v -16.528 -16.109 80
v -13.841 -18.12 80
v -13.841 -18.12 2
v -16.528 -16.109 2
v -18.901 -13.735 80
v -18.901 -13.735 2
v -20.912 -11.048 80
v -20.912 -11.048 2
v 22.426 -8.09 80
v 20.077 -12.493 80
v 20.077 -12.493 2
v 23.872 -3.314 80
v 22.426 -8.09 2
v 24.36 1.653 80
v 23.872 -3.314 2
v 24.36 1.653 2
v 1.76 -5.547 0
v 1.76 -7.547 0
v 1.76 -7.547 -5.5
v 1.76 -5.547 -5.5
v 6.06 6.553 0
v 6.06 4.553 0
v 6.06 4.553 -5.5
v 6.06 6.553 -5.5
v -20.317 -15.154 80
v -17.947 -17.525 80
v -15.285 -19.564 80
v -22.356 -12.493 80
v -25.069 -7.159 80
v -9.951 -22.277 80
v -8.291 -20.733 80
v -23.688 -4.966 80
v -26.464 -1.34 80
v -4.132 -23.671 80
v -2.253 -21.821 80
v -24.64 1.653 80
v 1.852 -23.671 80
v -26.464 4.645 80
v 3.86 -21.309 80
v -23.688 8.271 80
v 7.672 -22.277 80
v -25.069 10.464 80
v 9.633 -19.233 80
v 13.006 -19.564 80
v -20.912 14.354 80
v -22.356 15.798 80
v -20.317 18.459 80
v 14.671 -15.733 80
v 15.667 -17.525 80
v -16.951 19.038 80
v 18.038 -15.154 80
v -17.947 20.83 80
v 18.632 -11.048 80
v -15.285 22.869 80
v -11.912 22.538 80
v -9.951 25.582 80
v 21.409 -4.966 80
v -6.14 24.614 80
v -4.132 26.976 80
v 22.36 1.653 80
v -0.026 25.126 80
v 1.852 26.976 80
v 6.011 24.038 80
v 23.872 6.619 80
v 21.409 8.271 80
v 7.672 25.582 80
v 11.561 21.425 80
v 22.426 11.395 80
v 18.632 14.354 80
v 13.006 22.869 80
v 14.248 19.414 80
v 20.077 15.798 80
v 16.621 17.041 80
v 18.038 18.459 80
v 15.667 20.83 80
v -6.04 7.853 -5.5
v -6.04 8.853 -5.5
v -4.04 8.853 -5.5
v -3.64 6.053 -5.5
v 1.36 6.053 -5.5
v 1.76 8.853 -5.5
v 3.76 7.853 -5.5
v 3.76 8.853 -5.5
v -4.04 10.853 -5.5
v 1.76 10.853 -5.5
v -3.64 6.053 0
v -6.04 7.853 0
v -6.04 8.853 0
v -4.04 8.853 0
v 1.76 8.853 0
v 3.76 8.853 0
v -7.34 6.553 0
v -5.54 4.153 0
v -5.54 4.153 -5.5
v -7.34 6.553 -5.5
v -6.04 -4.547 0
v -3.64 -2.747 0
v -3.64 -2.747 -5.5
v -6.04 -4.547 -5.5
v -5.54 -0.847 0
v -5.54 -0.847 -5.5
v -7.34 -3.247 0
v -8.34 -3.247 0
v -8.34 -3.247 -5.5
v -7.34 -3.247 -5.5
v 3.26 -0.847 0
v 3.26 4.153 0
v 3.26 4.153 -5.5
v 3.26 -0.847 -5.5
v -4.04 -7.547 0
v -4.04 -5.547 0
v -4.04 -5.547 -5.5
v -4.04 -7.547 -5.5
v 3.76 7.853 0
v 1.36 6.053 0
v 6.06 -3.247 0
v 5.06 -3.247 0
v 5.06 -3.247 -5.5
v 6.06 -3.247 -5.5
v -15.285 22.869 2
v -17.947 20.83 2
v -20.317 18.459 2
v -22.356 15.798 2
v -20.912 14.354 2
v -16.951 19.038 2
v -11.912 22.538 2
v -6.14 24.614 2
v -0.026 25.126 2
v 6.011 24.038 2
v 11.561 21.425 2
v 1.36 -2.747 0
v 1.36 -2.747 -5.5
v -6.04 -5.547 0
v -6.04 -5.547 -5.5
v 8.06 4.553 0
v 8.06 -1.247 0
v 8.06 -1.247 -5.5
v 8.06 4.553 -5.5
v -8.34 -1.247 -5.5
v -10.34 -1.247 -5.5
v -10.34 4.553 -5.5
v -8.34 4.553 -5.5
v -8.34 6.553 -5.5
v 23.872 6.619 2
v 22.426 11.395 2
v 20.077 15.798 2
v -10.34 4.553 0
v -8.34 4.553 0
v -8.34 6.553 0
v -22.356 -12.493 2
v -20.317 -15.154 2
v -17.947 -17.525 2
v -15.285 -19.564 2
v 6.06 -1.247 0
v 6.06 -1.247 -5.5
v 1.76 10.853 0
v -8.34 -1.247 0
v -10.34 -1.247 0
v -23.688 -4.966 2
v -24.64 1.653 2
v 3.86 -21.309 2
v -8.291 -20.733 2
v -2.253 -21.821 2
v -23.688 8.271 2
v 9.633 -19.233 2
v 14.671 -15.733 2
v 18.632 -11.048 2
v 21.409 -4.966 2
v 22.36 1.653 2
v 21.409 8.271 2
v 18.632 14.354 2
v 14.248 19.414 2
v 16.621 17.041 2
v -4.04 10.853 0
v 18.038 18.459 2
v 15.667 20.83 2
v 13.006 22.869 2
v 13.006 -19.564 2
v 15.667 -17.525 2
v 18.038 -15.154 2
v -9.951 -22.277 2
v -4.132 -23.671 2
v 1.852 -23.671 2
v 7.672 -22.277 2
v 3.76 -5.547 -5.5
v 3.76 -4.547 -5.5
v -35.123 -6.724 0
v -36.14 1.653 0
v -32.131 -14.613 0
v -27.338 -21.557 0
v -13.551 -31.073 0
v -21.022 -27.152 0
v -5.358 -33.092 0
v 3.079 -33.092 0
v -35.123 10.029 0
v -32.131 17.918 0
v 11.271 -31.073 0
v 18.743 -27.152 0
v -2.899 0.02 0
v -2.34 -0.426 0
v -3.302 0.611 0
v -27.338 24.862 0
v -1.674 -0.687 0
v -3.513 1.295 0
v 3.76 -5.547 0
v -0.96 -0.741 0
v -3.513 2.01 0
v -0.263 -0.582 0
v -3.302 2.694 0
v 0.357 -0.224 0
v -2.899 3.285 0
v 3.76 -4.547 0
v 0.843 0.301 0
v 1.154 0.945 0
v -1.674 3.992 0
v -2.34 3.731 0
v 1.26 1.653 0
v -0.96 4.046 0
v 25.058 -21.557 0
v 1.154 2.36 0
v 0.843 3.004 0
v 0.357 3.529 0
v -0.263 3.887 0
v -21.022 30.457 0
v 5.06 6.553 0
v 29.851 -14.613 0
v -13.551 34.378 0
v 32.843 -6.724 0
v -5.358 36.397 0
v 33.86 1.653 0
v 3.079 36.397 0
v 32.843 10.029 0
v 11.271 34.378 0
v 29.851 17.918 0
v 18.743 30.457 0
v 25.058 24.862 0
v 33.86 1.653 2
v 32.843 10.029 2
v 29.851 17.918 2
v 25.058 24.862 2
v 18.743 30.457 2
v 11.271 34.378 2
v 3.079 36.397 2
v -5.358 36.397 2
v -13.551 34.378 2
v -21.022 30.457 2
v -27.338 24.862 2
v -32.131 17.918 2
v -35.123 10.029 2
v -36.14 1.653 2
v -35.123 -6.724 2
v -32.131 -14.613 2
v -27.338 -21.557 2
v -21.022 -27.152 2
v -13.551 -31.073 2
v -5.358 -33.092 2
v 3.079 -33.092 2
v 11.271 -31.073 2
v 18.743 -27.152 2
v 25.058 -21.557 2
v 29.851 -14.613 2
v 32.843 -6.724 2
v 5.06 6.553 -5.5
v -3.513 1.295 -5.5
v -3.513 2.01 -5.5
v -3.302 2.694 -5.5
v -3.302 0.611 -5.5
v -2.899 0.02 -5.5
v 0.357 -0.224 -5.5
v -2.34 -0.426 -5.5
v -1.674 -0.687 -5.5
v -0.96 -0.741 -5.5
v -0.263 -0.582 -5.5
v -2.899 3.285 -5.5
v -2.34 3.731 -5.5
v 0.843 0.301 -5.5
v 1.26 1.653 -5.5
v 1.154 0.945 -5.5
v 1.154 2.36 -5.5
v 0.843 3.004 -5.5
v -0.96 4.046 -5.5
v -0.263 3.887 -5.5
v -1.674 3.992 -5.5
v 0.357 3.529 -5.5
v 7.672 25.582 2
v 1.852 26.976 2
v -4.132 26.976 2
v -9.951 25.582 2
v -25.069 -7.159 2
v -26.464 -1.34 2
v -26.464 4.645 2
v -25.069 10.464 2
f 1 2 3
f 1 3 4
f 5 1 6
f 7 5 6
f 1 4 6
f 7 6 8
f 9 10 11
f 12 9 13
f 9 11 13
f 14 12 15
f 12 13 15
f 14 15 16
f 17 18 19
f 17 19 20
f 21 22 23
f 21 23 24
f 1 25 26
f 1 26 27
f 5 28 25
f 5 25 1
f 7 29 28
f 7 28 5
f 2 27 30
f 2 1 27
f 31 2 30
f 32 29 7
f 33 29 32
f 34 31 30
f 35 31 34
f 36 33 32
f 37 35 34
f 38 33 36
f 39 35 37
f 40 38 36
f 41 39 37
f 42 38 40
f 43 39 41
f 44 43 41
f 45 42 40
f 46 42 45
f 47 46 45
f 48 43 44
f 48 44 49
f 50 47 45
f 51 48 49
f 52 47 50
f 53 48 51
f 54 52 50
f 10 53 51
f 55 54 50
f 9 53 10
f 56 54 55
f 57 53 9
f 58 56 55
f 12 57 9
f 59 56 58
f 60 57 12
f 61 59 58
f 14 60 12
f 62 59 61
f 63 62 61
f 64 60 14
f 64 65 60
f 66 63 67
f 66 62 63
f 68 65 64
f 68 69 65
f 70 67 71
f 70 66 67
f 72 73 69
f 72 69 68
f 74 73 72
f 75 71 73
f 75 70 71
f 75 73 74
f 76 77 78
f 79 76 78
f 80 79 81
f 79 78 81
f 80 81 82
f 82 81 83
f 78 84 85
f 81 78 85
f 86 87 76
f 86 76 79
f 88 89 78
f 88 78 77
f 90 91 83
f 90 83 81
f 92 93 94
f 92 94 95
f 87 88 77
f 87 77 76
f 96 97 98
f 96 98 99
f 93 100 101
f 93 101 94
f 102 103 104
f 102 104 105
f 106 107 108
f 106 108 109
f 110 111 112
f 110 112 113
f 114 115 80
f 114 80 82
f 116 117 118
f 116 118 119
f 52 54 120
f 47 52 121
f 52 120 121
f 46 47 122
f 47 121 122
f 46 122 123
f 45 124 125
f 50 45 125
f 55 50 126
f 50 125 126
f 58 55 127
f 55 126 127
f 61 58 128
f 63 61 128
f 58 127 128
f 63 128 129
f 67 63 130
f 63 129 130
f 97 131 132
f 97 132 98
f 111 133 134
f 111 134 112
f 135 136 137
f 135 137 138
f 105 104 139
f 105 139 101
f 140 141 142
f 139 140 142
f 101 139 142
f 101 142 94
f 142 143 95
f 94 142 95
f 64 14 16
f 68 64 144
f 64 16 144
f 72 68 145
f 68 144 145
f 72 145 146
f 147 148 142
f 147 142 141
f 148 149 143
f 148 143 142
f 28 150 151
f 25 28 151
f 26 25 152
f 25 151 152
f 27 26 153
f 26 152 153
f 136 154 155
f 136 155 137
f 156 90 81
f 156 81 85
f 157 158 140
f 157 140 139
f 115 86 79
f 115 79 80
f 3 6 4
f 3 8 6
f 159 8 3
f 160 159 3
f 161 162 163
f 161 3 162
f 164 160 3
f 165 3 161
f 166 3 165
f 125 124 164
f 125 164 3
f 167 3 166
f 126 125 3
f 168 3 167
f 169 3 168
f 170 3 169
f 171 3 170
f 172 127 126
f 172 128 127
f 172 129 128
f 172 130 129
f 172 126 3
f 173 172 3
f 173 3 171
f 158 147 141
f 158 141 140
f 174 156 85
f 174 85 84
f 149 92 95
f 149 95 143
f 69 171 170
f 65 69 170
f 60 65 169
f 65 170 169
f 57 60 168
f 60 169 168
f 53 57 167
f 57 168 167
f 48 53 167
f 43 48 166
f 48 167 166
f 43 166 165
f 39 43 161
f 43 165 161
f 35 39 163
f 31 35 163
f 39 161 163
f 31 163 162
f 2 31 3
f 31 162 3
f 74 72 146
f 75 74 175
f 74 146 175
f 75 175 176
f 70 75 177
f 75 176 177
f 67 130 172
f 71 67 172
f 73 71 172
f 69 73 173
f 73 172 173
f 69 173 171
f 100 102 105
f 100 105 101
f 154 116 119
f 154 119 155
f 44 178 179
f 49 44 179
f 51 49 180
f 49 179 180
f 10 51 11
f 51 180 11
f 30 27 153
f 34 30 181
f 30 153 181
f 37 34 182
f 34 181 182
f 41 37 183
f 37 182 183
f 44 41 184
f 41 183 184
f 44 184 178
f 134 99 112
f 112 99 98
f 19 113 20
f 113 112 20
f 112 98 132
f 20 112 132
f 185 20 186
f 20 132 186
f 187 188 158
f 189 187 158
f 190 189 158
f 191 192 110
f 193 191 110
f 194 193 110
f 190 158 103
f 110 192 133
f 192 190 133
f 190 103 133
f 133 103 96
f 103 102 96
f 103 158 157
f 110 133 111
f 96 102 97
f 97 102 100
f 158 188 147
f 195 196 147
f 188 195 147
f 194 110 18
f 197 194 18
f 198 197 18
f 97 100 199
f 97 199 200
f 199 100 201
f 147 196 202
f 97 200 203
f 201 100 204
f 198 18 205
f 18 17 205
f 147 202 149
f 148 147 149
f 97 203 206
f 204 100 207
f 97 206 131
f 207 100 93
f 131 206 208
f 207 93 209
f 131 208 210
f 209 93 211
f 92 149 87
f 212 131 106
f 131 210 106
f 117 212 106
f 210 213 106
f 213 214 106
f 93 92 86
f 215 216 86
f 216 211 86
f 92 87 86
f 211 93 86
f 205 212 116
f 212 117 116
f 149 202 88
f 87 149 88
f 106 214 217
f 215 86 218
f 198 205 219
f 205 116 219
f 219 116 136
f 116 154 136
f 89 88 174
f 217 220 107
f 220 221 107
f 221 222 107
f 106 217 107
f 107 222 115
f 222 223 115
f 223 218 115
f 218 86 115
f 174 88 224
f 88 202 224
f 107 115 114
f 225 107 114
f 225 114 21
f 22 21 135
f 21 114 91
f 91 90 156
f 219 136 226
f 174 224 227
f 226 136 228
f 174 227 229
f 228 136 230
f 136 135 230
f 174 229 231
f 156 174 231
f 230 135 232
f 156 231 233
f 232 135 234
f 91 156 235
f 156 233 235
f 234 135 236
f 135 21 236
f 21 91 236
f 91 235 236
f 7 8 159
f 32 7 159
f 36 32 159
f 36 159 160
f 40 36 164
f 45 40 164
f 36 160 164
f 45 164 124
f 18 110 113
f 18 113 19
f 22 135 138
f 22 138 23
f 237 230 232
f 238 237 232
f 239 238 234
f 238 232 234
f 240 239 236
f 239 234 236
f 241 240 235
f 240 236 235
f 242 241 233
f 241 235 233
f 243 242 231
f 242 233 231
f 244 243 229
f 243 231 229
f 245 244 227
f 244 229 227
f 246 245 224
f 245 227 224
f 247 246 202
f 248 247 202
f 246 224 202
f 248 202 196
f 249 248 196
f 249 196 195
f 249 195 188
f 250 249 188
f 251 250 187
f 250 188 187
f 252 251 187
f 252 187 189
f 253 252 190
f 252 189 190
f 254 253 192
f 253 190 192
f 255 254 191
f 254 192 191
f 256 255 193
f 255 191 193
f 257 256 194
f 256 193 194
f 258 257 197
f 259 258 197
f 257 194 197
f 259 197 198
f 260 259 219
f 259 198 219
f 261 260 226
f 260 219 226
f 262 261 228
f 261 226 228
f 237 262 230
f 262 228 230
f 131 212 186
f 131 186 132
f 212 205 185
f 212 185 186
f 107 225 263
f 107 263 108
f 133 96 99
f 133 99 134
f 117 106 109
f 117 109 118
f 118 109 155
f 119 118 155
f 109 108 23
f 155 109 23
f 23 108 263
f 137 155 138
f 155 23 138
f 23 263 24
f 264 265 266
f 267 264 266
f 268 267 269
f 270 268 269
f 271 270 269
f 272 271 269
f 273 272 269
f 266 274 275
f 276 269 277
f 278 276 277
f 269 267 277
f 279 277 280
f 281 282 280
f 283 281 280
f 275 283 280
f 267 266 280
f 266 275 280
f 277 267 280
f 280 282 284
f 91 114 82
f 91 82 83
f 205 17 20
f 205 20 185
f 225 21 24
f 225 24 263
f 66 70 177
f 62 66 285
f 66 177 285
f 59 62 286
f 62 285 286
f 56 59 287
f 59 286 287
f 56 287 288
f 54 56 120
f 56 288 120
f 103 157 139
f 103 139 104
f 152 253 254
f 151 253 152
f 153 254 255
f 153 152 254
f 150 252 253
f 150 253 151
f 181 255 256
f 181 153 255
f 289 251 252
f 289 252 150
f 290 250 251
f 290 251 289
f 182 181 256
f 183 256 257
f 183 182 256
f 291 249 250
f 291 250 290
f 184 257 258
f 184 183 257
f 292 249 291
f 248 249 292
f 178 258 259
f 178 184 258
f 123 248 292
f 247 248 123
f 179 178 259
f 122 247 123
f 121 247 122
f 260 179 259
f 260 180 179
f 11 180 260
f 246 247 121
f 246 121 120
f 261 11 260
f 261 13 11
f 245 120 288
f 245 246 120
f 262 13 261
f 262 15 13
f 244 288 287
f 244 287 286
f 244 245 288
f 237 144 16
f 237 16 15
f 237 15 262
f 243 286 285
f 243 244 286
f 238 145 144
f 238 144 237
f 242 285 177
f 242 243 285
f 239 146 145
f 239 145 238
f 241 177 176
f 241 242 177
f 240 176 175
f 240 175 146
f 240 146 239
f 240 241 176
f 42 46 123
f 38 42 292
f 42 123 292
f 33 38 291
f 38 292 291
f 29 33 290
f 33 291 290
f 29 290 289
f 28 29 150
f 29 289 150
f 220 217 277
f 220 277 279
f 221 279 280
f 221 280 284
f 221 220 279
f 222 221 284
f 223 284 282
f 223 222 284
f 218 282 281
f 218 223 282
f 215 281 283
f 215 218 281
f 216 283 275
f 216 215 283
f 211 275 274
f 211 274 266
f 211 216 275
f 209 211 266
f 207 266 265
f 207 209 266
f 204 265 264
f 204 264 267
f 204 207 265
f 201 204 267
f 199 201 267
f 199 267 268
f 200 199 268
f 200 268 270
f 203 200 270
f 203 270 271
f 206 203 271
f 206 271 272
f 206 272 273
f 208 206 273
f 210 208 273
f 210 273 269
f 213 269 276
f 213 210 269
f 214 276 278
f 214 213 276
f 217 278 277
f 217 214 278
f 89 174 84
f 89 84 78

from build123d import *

# Parameters (mm, degrees)
F0_R     = 35
F0_R_2   = 2.4
F1_DEPTH = 2
F2_DEPTH = 80
F3_DEPTH = 5.5


# Not quite as in the source:
# - a feature names something its author has since deleted; it is built from what else it names


with BuildPart() as f1:
    # F0 (on Top) → F1 (new body)
    with BuildSketch(Plane.XY):
        with Locations((-1.1396982046, 1.6525272475)):
            Circle(F0_R)
        with BuildLine():
            ThreePointArc((24.3603017954, 1.6525272475), (23.2660064022, -5.7374377488), (20.0770404114, -12.4931435567))
            ThreePointArc((20.0770404114, -12.4931435567), (16.8915247156, -16.3786956728), (13.0059725995, -19.5642113686))
            ThreePointArc((13.0059725995, -19.5642113686), (-1.1396982046, -23.8474727525), (-15.2853690088, -19.5642113686))
            ThreePointArc((-15.2853690088, -19.5642113686), (-19.1709211249, -16.3786956728), (-22.3564368206, -12.4931435567))
            ThreePointArc((-22.3564368206, -12.4931435567), (-26.6396982046, 1.6525272475), (-22.3564368206, 15.7981980516))
            ThreePointArc((-22.3564368206, 15.7981980516), (-19.1709211249, 19.6837501677), (-15.2853690088, 22.8692658635))
            ThreePointArc((-15.2853690088, 22.8692658635), (-1.1396982046, 27.1525272475), (13.0059725995, 22.8692658635))
            ThreePointArc((13.0059725995, 22.8692658635), (16.8915247156, 19.6837501677), (20.0770404114, 15.7981980516))
            ThreePointArc((20.0770404114, 15.7981980516), (23.2660064022, 9.0424922437), (24.3603017954, 1.6525272475))
        make_face(mode=Mode.SUBTRACT)
        with BuildLine():
            ThreePointArc((11.5613007706, -18.1195395396), (15.4773111533, -14.9644821104), (18.6323685824, -11.0484717277))
            ThreePointArc((18.6323685824, -11.0484717277), (21.4090663901, -4.9658725026), (22.3603017954, 1.6525272475))
            ThreePointArc((22.3603017954, 1.6525272475), (21.4090663901, 8.2709269976), (18.6323685824, 14.3535262227))
            ThreePointArc((18.6323685824, 14.3535262227), (15.4773111533, 18.2695366053), (11.5613007706, 21.4245940345))
            ThreePointArc((11.5613007706, 21.4245940345), (-1.1396982046, 25.1525272475), (-13.8406971798, 21.4245940345))
            ThreePointArc((-13.8406971798, 21.4245940345), (-17.7567075625, 18.2695366053), (-20.9117649917, 14.3535262227))
            ThreePointArc((-20.9117649917, 14.3535262227), (-24.6396982046, 1.6525272475), (-20.9117649917, -11.0484717277))
            ThreePointArc((-20.9117649917, -11.0484717277), (-17.7567075625, -14.9644821104), (-13.8406971798, -18.1195395396))
            ThreePointArc((-13.8406971798, -18.1195395396), (-1.1396982046, -21.8474727525), (11.5613007706, -18.1195395396))
        make_face()
        Polygon((1.7603017954, -5.5474727525), (1.7603017954, -7.5474727525), (-4.0396982046, -7.5474727525), (-4.0396982046, -5.5474727525), (-6.0396982046, -5.5474727525), (-6.0396982046, -4.5474727525), (-3.6396982046, -2.7474727525), (1.3603017954, -2.7474727525), (3.7603017954, -4.5474727525), (3.7603017954, -5.5474727525), align=None, mode=Mode.SUBTRACT)
        Polygon((-8.3396982046, -1.2474727525), (-10.3396982046, -1.2474727525), (-10.3396982046, 4.5525272475), (-8.3396982046, 4.5525272475), (-8.3396982046, 6.5525272475), (-7.3396982046, 6.5525272475), (-5.5396982046, 4.1525272475), (-5.5396982046, -0.8474727525), (-7.3396982046, -3.2474727525), (-8.3396982046, -3.2474727525), align=None, mode=Mode.SUBTRACT)
        Polygon((1.7603017954, 8.8525272475), (3.7603017954, 8.8525272475), (3.7603017954, 7.8525272475), (1.3603017954, 6.0525272475), (-3.6396982046, 6.0525272475), (-6.0396982046, 7.8525272475), (-6.0396982046, 8.8525272475), (-4.0396982046, 8.8525272475), (-4.0396982046, 10.8525272475), (1.7603017954, 10.8525272475), align=None, mode=Mode.SUBTRACT)
        with Locations((-1.1396982046, 1.6525272475)):
            Circle(F0_R_2, mode=Mode.SUBTRACT)
        Polygon((5.0603017954, -3.2474727525), (3.2603017954, -0.8474727525), (3.2603017954, 4.1525272475), (5.0603017954, 6.5525272475), (6.0603017954, 6.5525272475), (6.0603017954, 4.5525272475), (8.0603017954, 4.5525272475), (8.0603017954, -1.2474727525), (6.0603017954, -1.2474727525), (6.0603017954, -3.2474727525), align=None, mode=Mode.SUBTRACT)
        with BuildLine():
            Line((18.6323685824, -11.0484717277), (20.0770404114, -12.4931435567))
            ThreePointArc((20.0770404114, -12.4931435567), (23.2660064022, -5.7374377488), (24.3603017954, 1.6525272475))
            ThreePointArc((24.3603017954, 1.6525272475), (23.2660064022, 9.0424922437), (20.0770404114, 15.7981980516))
            Line((20.0770404114, 15.7981980516), (18.6323685824, 14.3535262227))
            ThreePointArc((18.6323685824, 14.3535262227), (21.4090663901, 8.2709269976), (22.3603017954, 1.6525272475))
            ThreePointArc((22.3603017954, 1.6525272475), (21.4090663901, -4.9658725026), (18.6323685824, -11.0484717277))
        make_face()
        with BuildLine():
            ThreePointArc((-15.2853690088, -19.5642113686), (-1.1396982046, -23.8474727525), (13.0059725995, -19.5642113686))
            Line((13.0059725995, -19.5642113686), (11.5613007706, -18.1195395396))
            ThreePointArc((11.5613007706, -18.1195395396), (-1.1396982046, -21.8474727525), (-13.8406971798, -18.1195395396))
            Line((-13.8406971798, -18.1195395396), (-15.2853690088, -19.5642113686))
        make_face()
        with BuildLine():
            Line((11.5613007706, 21.4245940345), (13.0059725995, 22.8692658635))
            ThreePointArc((13.0059725995, 22.8692658635), (-1.1396982046, 27.1525272475), (-15.2853690088, 22.8692658635))
            Line((-15.2853690088, 22.8692658635), (-13.8406971798, 21.4245940345))
            ThreePointArc((-13.8406971798, 21.4245940345), (-1.1396982046, 25.1525272475), (11.5613007706, 21.4245940345))
        make_face()
        with BuildLine():
            ThreePointArc((-22.3564368206, 15.7981980516), (-26.6396982046, 1.6525272475), (-22.3564368206, -12.4931435567))
            Line((-22.3564368206, -12.4931435567), (-20.9117649917, -11.0484717277))
            ThreePointArc((-20.9117649917, -11.0484717277), (-24.6396982046, 1.6525272475), (-20.9117649917, 14.3535262227))
            Line((-20.9117649917, 14.3535262227), (-22.3564368206, 15.7981980516))
        make_face()
        Polygon((-10.3396982046, 4.5525272475), (-10.3396982046, -1.2474727525), (-8.3396982046, -1.2474727525), (-8.3396982046, -3.2474727525), (-7.3396982046, -3.2474727525), (-5.5396982046, -0.8474727525), (-5.5396982046, 4.1525272475), (-7.3396982046, 6.5525272475), (-8.3396982046, 6.5525272475), (-8.3396982046, 4.5525272475), align=None)
        Polygon((3.2603017954, 4.1525272475), (3.2603017954, -0.8474727525), (5.0603017954, -3.2474727525), (6.0603017954, -3.2474727525), (6.0603017954, -1.2474727525), (8.0603017954, -1.2474727525), (8.0603017954, 4.5525272475), (6.0603017954, 4.5525272475), (6.0603017954, 6.5525272475), (5.0603017954, 6.5525272475), align=None)
        Polygon((-4.0396982046, -7.5474727525), (1.7603017954, -7.5474727525), (1.7603017954, -5.5474727525), (3.7603017954, -5.5474727525), (3.7603017954, -4.5474727525), (1.3603017954, -2.7474727525), (-3.6396982046, -2.7474727525), (-6.0396982046, -4.5474727525), (-6.0396982046, -5.5474727525), (-4.0396982046, -5.5474727525), align=None)
        Polygon((3.7603017954, 7.8525272475), (3.7603017954, 8.8525272475), (1.7603017954, 8.8525272475), (1.7603017954, 10.8525272475), (-4.0396982046, 10.8525272475), (-4.0396982046, 8.8525272475), (-6.0396982046, 8.8525272475), (-6.0396982046, 7.8525272475), (-3.6396982046, 6.0525272475), (1.3603017954, 6.0525272475), align=None)
        with BuildLine():
            ThreePointArc((13.0059725995, -19.5642113686), (16.8915247156, -16.3786956728), (20.0770404114, -12.4931435567))
            Line((20.0770404114, -12.4931435567), (18.6323685824, -11.0484717277))
            ThreePointArc((18.6323685824, -11.0484717277), (15.4773111533, -14.9644821104), (11.5613007706, -18.1195395396))
            Line((11.5613007706, -18.1195395396), (13.0059725995, -19.5642113686))
        make_face()
        with BuildLine():
            Line((18.6323685824, 14.3535262227), (20.0770404114, 15.7981980516))
            ThreePointArc((20.0770404114, 15.7981980516), (16.8915247156, 19.6837501677), (13.0059725995, 22.8692658635))
            Line((13.0059725995, 22.8692658635), (11.5613007706, 21.4245940345))
            ThreePointArc((11.5613007706, 21.4245940345), (15.4773111533, 18.2695366053), (18.6323685824, 14.3535262227))
        make_face()
        with BuildLine():
            ThreePointArc((-22.3564368206, -12.4931435567), (-19.1709211249, -16.3786956728), (-15.2853690088, -19.5642113686))
            Line((-15.2853690088, -19.5642113686), (-13.8406971798, -18.1195395396))
            ThreePointArc((-13.8406971798, -18.1195395396), (-17.7567075625, -14.9644821104), (-20.9117649917, -11.0484717277))
            Line((-20.9117649917, -11.0484717277), (-22.3564368206, -12.4931435567))
        make_face()
        with BuildLine():
            Line((-13.8406971798, 21.4245940345), (-15.2853690088, 22.8692658635))
            ThreePointArc((-15.2853690088, 22.8692658635), (-19.1709211249, 19.6837501677), (-22.3564368206, 15.7981980516))
            Line((-22.3564368206, 15.7981980516), (-20.9117649917, 14.3535262227))
            ThreePointArc((-20.9117649917, 14.3535262227), (-17.7567075625, 18.2695366053), (-13.8406971798, 21.4245940345))
        make_face()
        with Locations((-1.1396982046, 1.6525272475)):
            Circle(F0_R_2)
    extrude(amount=F1_DEPTH)

    # F0 (on Top) → F2 (join)
    with BuildSketch(Plane.XY):
        with BuildLine():
            Line((11.5613007706, 21.4245940345), (13.0059725995, 22.8692658635))
            ThreePointArc((13.0059725995, 22.8692658635), (-1.1396982046, 27.1525272475), (-15.2853690088, 22.8692658635))
            Line((-15.2853690088, 22.8692658635), (-13.8406971798, 21.4245940345))
            ThreePointArc((-13.8406971798, 21.4245940345), (-1.1396982046, 25.1525272475), (11.5613007706, 21.4245940345))
        make_face()
        with BuildLine():
            ThreePointArc((-22.3564368206, 15.7981980516), (-26.6396982046, 1.6525272475), (-22.3564368206, -12.4931435567))
            Line((-22.3564368206, -12.4931435567), (-20.9117649917, -11.0484717277))
            ThreePointArc((-20.9117649917, -11.0484717277), (-24.6396982046, 1.6525272475), (-20.9117649917, 14.3535262227))
            Line((-20.9117649917, 14.3535262227), (-22.3564368206, 15.7981980516))
        make_face()
        with BuildLine():
            ThreePointArc((-15.2853690088, -19.5642113686), (-1.1396982046, -23.8474727525), (13.0059725995, -19.5642113686))
            Line((13.0059725995, -19.5642113686), (11.5613007706, -18.1195395396))
            ThreePointArc((11.5613007706, -18.1195395396), (-1.1396982046, -21.8474727525), (-13.8406971798, -18.1195395396))
            Line((-13.8406971798, -18.1195395396), (-15.2853690088, -19.5642113686))
        make_face()
        with BuildLine():
            Line((18.6323685824, -11.0484717277), (20.0770404114, -12.4931435567))
            ThreePointArc((20.0770404114, -12.4931435567), (23.2660064022, -5.7374377488), (24.3603017954, 1.6525272475))
            ThreePointArc((24.3603017954, 1.6525272475), (23.2660064022, 9.0424922437), (20.0770404114, 15.7981980516))
            Line((20.0770404114, 15.7981980516), (18.6323685824, 14.3535262227))
            ThreePointArc((18.6323685824, 14.3535262227), (21.4090663901, 8.2709269976), (22.3603017954, 1.6525272475))
            ThreePointArc((22.3603017954, 1.6525272475), (21.4090663901, -4.9658725026), (18.6323685824, -11.0484717277))
        make_face()
        with BuildLine():
            ThreePointArc((13.0059725995, -19.5642113686), (16.8915247156, -16.3786956728), (20.0770404114, -12.4931435567))
            Line((20.0770404114, -12.4931435567), (18.6323685824, -11.0484717277))
            ThreePointArc((18.6323685824, -11.0484717277), (15.4773111533, -14.9644821104), (11.5613007706, -18.1195395396))
            Line((11.5613007706, -18.1195395396), (13.0059725995, -19.5642113686))
        make_face()
        with BuildLine():
            Line((18.6323685824, 14.3535262227), (20.0770404114, 15.7981980516))
            ThreePointArc((20.0770404114, 15.7981980516), (16.8915247156, 19.6837501677), (13.0059725995, 22.8692658635))
            Line((13.0059725995, 22.8692658635), (11.5613007706, 21.4245940345))
            ThreePointArc((11.5613007706, 21.4245940345), (15.4773111533, 18.2695366053), (18.6323685824, 14.3535262227))
        make_face()
        with BuildLine():
            Line((-13.8406971798, 21.4245940345), (-15.2853690088, 22.8692658635))
            ThreePointArc((-15.2853690088, 22.8692658635), (-19.1709211249, 19.6837501677), (-22.3564368206, 15.7981980516))
            Line((-22.3564368206, 15.7981980516), (-20.9117649917, 14.3535262227))
            ThreePointArc((-20.9117649917, 14.3535262227), (-17.7567075625, 18.2695366053), (-13.8406971798, 21.4245940345))
        make_face()
        with BuildLine():
            ThreePointArc((-22.3564368206, -12.4931435567), (-19.1709211249, -16.3786956728), (-15.2853690088, -19.5642113686))
            Line((-15.2853690088, -19.5642113686), (-13.8406971798, -18.1195395396))
            ThreePointArc((-13.8406971798, -18.1195395396), (-17.7567075625, -14.9644821104), (-20.9117649917, -11.0484717277))
            Line((-20.9117649917, -11.0484717277), (-22.3564368206, -12.4931435567))
        make_face()
    extrude(amount=F2_DEPTH)

    # F0 (on Top) → F3 (join)
    with BuildSketch(Plane.XY):
        Polygon((-10.3396982046, 4.5525272475), (-10.3396982046, -1.2474727525), (-8.3396982046, -1.2474727525), (-8.3396982046, -3.2474727525), (-7.3396982046, -3.2474727525), (-5.5396982046, -0.8474727525), (-5.5396982046, 4.1525272475), (-7.3396982046, 6.5525272475), (-8.3396982046, 6.5525272475), (-8.3396982046, 4.5525272475), align=None)
        Polygon((3.2603017954, 4.1525272475), (3.2603017954, -0.8474727525), (5.0603017954, -3.2474727525), (6.0603017954, -3.2474727525), (6.0603017954, -1.2474727525), (8.0603017954, -1.2474727525), (8.0603017954, 4.5525272475), (6.0603017954, 4.5525272475), (6.0603017954, 6.5525272475), (5.0603017954, 6.5525272475), align=None)
        Polygon((-4.0396982046, -7.5474727525), (1.7603017954, -7.5474727525), (1.7603017954, -5.5474727525), (3.7603017954, -5.5474727525), (3.7603017954, -4.5474727525), (1.3603017954, -2.7474727525), (-3.6396982046, -2.7474727525), (-6.0396982046, -4.5474727525), (-6.0396982046, -5.5474727525), (-4.0396982046, -5.5474727525), align=None)
        Polygon((3.7603017954, 7.8525272475), (3.7603017954, 8.8525272475), (1.7603017954, 8.8525272475), (1.7603017954, 10.8525272475), (-4.0396982046, 10.8525272475), (-4.0396982046, 8.8525272475), (-6.0396982046, 8.8525272475), (-6.0396982046, 7.8525272475), (-3.6396982046, 6.0525272475), (1.3603017954, 6.0525272475), align=None)
        with Locations((-1.1396982046, 1.6525272475)):
            Circle(F0_R_2)
    extrude(amount=-F3_DEPTH)


solid = f1.part
